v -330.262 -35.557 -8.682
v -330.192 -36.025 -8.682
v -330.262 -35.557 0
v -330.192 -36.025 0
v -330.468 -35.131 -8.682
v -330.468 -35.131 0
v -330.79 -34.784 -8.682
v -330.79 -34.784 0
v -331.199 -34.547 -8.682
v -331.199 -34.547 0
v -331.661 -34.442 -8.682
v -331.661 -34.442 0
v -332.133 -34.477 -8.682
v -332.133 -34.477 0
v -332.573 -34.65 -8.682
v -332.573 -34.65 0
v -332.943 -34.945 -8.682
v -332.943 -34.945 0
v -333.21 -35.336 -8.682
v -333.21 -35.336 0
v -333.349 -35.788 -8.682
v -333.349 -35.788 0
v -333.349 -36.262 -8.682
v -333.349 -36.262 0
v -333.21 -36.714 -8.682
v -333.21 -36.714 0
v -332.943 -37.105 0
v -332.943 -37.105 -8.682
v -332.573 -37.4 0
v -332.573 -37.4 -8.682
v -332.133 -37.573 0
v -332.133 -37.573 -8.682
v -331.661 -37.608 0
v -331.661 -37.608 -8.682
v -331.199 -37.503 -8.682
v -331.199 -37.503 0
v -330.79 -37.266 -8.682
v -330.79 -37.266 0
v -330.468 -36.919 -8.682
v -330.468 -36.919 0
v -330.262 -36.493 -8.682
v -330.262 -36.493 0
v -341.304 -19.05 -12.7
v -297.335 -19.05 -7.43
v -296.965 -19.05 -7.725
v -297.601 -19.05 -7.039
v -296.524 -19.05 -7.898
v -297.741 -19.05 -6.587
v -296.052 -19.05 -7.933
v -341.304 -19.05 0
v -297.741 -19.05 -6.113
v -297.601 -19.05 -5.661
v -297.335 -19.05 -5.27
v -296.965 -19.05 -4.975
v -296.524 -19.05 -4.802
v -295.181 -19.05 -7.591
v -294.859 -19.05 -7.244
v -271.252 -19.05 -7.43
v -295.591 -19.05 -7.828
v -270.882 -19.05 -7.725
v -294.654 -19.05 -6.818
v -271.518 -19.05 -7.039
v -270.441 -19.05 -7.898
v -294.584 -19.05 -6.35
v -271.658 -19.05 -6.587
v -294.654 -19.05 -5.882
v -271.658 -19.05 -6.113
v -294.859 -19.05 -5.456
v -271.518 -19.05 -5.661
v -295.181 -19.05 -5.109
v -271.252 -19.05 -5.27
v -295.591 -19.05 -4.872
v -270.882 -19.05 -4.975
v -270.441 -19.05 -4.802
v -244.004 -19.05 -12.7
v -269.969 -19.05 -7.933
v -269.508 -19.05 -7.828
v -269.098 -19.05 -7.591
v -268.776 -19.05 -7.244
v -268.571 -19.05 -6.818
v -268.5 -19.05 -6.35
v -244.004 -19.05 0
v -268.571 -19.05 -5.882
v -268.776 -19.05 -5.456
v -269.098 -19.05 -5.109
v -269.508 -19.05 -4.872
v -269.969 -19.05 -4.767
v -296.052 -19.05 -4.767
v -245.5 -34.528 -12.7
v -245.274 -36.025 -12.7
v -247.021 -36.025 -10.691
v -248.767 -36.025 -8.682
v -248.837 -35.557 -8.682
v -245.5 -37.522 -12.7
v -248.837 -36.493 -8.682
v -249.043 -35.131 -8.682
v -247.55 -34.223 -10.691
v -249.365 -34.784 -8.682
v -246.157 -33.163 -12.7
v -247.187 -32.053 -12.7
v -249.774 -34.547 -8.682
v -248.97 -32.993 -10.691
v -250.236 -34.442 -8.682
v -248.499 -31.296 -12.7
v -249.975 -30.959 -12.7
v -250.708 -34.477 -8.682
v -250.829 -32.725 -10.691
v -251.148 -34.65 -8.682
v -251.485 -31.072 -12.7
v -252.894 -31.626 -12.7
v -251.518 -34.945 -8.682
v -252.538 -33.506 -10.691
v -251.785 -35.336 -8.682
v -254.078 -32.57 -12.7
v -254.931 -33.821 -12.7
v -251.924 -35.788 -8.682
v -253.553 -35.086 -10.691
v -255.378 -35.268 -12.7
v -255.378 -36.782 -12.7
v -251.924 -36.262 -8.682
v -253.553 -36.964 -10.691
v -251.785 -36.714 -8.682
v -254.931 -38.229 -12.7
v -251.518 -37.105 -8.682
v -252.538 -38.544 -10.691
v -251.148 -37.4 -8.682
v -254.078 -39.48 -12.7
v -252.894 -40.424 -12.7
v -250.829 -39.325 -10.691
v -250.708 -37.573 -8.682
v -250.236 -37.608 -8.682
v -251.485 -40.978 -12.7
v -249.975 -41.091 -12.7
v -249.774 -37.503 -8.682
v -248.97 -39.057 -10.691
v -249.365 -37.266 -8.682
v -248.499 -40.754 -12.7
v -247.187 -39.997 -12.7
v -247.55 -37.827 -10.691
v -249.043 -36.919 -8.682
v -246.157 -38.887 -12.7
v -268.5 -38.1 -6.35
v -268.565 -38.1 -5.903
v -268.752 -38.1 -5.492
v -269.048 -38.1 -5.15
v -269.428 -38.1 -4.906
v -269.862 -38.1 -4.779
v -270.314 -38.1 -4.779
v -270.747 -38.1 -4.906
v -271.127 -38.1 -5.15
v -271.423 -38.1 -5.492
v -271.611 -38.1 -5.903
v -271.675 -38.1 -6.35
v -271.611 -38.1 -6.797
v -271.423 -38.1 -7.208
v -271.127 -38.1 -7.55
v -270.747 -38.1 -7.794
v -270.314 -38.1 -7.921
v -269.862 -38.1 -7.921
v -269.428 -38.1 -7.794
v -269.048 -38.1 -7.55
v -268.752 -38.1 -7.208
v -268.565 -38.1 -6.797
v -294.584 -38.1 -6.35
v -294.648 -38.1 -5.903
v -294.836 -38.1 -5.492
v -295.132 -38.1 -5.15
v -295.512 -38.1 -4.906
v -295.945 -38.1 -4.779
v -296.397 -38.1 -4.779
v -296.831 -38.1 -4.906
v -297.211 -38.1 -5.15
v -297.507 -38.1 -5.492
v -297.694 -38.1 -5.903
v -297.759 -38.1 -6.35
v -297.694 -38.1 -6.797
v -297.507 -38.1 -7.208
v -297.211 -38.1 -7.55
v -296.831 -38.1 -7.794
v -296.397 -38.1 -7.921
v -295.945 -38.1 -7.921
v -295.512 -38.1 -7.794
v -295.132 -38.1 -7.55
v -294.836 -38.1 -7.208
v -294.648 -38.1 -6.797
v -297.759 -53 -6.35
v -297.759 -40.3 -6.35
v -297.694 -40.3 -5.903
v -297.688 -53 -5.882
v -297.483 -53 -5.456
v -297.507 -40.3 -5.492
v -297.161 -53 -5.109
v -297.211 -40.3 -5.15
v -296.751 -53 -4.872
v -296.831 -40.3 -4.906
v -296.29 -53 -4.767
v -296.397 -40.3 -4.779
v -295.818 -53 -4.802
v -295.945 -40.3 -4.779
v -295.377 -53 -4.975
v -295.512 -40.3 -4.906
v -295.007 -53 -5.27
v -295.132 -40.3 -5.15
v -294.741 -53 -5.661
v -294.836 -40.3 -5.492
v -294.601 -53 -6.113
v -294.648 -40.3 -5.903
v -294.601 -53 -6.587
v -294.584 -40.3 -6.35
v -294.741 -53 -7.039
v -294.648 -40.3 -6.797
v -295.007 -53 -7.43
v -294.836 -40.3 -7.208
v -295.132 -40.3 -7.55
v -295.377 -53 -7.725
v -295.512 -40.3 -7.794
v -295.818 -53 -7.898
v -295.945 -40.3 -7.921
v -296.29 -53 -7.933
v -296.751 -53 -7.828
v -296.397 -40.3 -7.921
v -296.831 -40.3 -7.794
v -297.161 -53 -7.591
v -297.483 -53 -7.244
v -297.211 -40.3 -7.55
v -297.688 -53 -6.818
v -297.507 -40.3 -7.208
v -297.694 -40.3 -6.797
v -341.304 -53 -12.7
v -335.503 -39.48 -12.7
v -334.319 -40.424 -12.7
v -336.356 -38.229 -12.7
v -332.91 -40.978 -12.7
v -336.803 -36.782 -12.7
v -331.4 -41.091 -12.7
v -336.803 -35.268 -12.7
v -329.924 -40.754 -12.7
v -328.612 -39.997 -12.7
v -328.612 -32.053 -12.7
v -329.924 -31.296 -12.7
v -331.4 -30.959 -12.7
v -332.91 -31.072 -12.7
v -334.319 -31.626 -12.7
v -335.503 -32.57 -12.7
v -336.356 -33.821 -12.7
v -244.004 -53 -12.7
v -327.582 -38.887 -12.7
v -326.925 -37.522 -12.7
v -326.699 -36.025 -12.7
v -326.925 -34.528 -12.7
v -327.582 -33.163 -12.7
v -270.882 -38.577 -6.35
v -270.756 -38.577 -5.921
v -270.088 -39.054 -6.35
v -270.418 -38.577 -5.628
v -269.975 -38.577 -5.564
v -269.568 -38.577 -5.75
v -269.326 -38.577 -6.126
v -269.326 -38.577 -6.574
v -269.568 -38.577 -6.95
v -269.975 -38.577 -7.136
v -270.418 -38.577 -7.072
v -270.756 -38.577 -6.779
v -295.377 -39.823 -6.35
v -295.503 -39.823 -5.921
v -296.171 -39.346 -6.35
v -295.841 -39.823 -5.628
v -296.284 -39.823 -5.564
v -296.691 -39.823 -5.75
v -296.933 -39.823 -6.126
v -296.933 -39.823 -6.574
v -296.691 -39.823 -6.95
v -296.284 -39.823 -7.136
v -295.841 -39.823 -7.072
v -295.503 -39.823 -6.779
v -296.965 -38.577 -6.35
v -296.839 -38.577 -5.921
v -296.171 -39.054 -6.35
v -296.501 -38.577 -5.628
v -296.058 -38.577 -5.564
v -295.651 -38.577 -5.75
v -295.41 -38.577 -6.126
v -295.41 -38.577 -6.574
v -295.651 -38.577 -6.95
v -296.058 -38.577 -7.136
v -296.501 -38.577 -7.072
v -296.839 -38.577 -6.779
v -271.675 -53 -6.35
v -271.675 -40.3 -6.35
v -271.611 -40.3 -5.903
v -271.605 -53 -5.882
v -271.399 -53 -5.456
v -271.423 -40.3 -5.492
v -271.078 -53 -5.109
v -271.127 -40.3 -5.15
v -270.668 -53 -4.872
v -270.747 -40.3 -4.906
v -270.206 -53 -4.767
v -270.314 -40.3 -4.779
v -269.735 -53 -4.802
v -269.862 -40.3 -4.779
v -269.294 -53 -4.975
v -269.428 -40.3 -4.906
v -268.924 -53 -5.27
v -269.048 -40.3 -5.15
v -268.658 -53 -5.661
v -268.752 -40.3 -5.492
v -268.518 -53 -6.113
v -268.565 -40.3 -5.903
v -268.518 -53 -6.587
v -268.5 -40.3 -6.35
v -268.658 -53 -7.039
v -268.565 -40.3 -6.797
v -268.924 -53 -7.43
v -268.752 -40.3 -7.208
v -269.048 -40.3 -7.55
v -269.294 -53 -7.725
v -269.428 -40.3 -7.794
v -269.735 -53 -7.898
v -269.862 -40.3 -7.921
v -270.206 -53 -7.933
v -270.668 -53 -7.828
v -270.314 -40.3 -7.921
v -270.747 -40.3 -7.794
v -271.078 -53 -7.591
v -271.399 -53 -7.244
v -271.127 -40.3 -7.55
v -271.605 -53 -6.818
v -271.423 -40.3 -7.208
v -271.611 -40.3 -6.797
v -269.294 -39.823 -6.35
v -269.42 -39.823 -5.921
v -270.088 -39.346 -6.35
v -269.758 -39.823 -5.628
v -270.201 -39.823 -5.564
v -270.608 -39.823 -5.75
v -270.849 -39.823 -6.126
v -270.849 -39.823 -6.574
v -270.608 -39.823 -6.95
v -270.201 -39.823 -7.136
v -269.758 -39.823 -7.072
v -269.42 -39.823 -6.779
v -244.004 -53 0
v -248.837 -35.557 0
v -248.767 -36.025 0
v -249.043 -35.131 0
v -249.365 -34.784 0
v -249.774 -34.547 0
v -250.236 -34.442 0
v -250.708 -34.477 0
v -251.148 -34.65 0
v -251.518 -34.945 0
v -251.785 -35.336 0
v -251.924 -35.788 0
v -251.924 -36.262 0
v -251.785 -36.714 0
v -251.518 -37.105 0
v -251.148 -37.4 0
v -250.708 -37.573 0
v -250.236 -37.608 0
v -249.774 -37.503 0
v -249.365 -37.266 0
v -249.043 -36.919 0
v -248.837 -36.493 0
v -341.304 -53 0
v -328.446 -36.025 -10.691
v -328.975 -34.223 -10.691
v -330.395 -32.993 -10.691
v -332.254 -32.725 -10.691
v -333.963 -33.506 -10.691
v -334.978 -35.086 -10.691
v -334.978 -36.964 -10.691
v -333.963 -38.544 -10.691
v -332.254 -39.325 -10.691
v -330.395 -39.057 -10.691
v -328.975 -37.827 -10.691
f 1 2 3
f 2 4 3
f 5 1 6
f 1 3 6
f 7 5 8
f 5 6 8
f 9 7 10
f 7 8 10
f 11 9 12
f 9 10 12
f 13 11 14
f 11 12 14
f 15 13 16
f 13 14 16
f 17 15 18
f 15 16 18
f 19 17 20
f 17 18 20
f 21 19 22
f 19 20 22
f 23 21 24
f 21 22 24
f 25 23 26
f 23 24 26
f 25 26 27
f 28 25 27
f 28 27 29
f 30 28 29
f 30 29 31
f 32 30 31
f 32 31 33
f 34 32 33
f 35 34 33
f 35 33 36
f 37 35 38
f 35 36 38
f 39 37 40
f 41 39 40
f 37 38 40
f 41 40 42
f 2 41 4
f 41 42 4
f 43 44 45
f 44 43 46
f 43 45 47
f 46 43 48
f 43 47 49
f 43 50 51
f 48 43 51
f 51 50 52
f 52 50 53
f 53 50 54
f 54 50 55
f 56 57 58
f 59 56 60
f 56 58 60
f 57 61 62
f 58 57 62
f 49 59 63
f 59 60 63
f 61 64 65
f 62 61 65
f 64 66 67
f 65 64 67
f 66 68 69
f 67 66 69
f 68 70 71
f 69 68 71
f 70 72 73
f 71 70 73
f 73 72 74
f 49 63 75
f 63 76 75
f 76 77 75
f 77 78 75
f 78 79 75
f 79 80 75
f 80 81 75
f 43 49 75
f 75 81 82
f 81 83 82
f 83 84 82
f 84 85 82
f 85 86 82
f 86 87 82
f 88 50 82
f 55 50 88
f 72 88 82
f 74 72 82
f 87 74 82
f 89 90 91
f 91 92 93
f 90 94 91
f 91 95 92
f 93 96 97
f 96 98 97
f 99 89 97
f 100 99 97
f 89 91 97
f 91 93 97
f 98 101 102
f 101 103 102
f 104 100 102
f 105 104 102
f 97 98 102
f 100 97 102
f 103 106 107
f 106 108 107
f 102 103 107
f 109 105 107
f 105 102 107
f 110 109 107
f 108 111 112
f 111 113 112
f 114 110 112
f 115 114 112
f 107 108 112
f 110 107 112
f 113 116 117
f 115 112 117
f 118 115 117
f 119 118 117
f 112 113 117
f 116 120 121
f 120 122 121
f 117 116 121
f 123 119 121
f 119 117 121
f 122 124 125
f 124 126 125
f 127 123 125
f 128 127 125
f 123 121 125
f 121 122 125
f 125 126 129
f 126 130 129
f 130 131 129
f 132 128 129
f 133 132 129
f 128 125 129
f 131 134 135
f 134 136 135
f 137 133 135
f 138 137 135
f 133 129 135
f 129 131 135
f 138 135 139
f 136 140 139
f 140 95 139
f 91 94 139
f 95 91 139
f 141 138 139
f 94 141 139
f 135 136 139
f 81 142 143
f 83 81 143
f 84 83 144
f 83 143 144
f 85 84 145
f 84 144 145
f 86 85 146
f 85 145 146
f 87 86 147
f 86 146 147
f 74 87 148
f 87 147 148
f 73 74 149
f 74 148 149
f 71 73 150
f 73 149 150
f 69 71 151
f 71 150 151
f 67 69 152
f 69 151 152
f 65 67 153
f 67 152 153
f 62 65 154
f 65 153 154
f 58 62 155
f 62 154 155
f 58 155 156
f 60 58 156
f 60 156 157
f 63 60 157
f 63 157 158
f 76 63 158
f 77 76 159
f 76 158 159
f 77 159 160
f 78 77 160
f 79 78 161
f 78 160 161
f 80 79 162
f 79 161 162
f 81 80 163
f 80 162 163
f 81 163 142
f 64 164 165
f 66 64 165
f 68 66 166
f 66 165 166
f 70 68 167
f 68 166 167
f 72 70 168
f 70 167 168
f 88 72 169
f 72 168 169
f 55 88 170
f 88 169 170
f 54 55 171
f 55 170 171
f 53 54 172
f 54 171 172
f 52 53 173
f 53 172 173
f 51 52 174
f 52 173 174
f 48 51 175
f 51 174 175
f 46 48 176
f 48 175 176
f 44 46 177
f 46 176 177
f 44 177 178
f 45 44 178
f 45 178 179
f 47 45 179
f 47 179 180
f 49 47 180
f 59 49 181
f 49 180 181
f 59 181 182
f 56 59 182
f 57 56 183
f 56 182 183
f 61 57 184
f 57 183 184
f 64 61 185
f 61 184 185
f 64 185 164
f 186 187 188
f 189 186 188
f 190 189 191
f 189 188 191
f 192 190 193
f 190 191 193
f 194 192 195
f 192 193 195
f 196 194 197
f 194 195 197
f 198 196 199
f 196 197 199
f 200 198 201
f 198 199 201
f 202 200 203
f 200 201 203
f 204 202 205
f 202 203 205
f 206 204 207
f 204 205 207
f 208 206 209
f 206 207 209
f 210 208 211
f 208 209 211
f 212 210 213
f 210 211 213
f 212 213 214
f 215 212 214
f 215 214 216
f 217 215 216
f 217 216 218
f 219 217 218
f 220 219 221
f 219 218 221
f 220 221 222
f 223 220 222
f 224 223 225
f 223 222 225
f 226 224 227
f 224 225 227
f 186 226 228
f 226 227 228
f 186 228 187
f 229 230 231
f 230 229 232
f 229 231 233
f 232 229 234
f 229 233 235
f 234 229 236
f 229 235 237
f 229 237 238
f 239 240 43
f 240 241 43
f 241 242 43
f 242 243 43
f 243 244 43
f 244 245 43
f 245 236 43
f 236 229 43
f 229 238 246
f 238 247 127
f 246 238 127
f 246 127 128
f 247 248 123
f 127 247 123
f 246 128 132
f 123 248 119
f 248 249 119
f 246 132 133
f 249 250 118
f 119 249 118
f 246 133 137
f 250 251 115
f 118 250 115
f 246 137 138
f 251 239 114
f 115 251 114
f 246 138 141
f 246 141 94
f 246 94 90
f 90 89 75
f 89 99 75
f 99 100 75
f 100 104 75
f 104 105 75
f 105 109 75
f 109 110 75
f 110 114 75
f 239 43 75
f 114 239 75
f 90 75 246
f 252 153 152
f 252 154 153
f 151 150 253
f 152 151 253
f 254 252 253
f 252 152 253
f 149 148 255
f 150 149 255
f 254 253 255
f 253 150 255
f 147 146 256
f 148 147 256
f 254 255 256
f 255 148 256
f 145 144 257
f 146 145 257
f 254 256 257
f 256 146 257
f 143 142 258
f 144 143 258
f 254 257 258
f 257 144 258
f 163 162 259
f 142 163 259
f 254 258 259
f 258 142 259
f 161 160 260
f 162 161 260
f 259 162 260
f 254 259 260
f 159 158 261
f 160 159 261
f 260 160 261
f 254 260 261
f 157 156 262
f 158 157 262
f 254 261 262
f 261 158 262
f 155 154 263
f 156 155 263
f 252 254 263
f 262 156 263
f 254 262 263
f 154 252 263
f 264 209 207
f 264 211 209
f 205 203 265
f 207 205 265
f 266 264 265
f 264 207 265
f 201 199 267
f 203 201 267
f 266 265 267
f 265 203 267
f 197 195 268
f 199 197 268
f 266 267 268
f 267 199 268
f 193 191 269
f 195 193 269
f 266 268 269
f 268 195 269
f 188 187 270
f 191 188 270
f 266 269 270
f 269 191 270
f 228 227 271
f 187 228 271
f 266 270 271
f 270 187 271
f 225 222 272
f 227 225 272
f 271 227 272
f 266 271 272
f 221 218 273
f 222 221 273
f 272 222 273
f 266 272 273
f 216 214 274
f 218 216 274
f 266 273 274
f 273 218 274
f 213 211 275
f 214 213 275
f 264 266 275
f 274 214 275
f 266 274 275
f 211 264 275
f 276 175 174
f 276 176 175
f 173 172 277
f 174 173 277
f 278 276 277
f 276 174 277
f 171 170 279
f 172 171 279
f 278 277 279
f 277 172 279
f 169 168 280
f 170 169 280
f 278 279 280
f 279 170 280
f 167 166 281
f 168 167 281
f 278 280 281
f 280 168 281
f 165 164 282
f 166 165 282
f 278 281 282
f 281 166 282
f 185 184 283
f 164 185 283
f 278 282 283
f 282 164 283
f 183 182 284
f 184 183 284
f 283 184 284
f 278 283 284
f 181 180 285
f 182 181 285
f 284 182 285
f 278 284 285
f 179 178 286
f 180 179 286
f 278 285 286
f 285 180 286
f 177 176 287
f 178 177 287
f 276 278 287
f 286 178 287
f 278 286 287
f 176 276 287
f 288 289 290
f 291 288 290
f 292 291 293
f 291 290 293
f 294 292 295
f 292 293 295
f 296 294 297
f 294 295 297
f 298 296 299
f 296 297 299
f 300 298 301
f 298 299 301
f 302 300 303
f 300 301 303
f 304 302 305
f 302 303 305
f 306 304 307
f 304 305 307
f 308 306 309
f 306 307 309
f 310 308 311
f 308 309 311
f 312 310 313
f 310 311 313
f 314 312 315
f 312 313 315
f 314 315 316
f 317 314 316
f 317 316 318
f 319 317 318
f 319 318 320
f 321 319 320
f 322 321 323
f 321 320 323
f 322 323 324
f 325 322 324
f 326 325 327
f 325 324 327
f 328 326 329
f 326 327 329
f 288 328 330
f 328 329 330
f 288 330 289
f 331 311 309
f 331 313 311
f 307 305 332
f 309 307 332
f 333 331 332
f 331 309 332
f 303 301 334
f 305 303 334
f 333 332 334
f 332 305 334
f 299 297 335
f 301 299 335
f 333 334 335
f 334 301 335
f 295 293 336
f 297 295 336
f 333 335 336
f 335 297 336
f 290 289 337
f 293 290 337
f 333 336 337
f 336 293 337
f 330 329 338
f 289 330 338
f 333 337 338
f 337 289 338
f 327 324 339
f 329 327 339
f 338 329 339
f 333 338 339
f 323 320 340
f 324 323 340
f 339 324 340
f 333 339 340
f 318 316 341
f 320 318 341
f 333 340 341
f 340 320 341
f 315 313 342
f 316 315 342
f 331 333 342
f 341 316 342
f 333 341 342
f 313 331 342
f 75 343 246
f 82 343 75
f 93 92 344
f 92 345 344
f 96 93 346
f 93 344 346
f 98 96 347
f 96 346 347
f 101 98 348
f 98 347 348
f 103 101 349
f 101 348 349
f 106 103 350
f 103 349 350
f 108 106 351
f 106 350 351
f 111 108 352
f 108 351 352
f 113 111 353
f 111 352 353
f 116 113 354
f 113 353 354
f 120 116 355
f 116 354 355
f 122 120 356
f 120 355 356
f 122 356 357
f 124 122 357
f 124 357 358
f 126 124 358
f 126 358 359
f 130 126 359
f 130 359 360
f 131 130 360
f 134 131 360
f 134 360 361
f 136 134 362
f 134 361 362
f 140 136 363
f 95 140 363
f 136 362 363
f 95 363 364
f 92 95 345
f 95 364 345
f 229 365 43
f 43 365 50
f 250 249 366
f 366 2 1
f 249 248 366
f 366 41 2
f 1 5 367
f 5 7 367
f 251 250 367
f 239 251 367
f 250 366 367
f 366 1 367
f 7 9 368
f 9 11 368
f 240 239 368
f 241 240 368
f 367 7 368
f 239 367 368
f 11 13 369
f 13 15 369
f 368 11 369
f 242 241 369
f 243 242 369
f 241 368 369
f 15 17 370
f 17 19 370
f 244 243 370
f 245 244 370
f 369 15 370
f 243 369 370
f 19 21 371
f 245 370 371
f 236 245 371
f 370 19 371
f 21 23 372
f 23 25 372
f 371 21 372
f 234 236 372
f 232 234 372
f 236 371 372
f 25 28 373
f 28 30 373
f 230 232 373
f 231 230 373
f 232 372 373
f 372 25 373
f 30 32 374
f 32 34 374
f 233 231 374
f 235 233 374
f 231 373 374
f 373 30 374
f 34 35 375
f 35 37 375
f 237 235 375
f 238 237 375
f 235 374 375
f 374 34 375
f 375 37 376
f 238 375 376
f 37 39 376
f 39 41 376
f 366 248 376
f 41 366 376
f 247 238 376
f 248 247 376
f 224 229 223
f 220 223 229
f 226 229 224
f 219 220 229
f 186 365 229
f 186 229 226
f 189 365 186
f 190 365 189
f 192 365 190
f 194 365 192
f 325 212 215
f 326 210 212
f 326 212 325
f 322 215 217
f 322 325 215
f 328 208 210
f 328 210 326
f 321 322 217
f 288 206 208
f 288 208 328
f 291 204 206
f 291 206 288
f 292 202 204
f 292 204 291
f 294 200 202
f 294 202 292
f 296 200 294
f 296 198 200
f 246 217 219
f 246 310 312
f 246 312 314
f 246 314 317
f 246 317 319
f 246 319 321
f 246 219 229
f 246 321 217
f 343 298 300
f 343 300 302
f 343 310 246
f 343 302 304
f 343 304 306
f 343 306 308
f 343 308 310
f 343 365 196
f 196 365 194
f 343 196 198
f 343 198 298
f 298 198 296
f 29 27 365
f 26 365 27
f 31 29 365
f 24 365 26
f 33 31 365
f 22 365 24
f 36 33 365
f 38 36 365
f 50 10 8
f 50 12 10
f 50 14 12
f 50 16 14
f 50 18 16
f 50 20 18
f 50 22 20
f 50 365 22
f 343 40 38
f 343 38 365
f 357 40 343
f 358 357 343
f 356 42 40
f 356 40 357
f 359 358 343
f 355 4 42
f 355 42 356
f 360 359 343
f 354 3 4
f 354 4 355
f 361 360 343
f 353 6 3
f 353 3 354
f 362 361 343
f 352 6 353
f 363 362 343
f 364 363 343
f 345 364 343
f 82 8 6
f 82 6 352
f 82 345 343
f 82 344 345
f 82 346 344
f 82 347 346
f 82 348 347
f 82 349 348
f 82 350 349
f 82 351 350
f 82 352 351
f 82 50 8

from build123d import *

# Parameters (mm, degrees)
SKETCH1_W           = 97.3
SKETCH1_H           = 33.95
BOSS_EXTRUDE1_DEPTH = 12.7
HOLE1_D             = 3.175
HOLE1_DEPTH         = 31.75
HOLE1_CSINK_D       = 10.16
HOLE1_CSINK_ANGLE   = 82
HOLE1_TIP           = 0.953866233
HOLE2_D             = 3.175
HOLE2_DEPTH         = 31.75
HOLE2_CSINK_D       = 10.16
HOLE2_CSINK_ANGLE   = 82
HOLE2_TIP           = 0.953866233
HOLE5_D             = 3.175
HOLE5_DEPTH         = 31.75
HOLE5_CSINK_D       = 10.16
HOLE5_CSINK_ANGLE   = 82
HOLE5_TIP           = 0.953866233
HOLE6_D             = 3.175
HOLE6_DEPTH         = 31.75
HOLE6_CSINK_D       = 10.16
HOLE6_CSINK_ANGLE   = 82
HOLE6_TIP           = 0.953866233


with BuildPart() as part:
    # Sketch1 → Boss-Extrude1 (new body)
    with BuildSketch(Plane.XY):
        with Locations((-292.654465963, -36.025)):
            Rectangle(SKETCH1_W, SKETCH1_H)
    extrude(amount=-BOSS_EXTRUDE1_DEPTH)

    # Hole1
    with Locations(Plane(origin=(-124.004465969, 0, -10.424290059), x_dir=(-1, 0, 0), z_dir=(0, 1, 0))):
        with Locations((126.349999994, 161.374290059), (146.083333327, 4.074290059), (172.166666661, 4.074290059), (126.349999994, 34.524290059), (126.349999994, 130.924290059), (-172.166666661, 4.074290059), (-146.083333327, 4.074290059), (-126.349999994, 34.524290059), (-126.349999994, 130.924290059), (-126.349999994, 161.374290059)):
            CounterSinkHole(HOLE1_D / 2, HOLE1_CSINK_D / 2, depth=HOLE1_DEPTH, counter_sink_angle=HOLE1_CSINK_ANGLE)
            with Locations((0, 0, -(HOLE1_DEPTH + HOLE1_TIP / 2))):  # 118° drill point
                Cone(0, HOLE1_D / 2, HOLE1_TIP, mode=Mode.SUBTRACT)

    # Hole2
    with Locations(Plane(origin=(-124.004465969, -72.05, -10.424290059), x_dir=(1, 0, 0), z_dir=(0, -1, 0))):
        with Locations((126.349999994, 161.374290059), (146.083333327, 4.074290059), (172.166666661, 4.074290059), (126.349999994, 34.524290059), (126.349999994, 130.924290059), (-172.166666661, 4.074290059), (-146.083333327, 4.074290059), (-126.349999994, 34.524290059), (-126.349999994, 130.924290059), (-126.349999994, 161.374290059)):
            CounterSinkHole(HOLE2_D / 2, HOLE2_CSINK_D / 2, depth=HOLE2_DEPTH, counter_sink_angle=HOLE2_CSINK_ANGLE)
            with Locations((0, 0, -(HOLE2_DEPTH + HOLE2_TIP / 2))):  # 118° drill point
                Cone(0, HOLE2_D / 2, HOLE2_TIP, mode=Mode.SUBTRACT)

    # Hole5
    with Locations(Plane(origin=(-124.004465969, -208.286738577, -12.7), x_dir=(-1, 0, 0), z_dir=(0, 0, -1))):
        with Locations((207.774999994, 172.261738577), (126.349999994, 172.261738577)):
            CounterSinkHole(HOLE5_D / 2, HOLE5_CSINK_D / 2, depth=HOLE5_DEPTH, counter_sink_angle=HOLE5_CSINK_ANGLE)
            with Locations((0, 0, -(HOLE5_DEPTH + HOLE5_TIP / 2))):  # 118° drill point
                Cone(0, HOLE5_D / 2, HOLE5_TIP, mode=Mode.SUBTRACT)

    # Hole6
    with Locations(Plane(origin=(-124.004465969, -6.35, -10.424290059), x_dir=(-1, 0, 0), z_dir=(0, 1, 0))):
        with Locations((-207.774999994, 333.02141023), (-207.774999994, 225.48903684), (-207.774999994, 137.424290059), (-172.166666661, 4.074290059), (-146.083333327, 4.074290059), (-94.599999994, 161.374290059), (94.599999994, 161.374290059), (146.083333327, 4.074290059), (172.166666661, 4.074290059), (207.774999994, 137.424290059), (207.774999994, 225.48903684), (207.774999994, 333.02141023), (166.795833328, 301.970350905), (40.979166666, 301.970350905), (-40.979166666, 301.970350905), (-166.795833328, 301.970350905), (0, 193.124290059), (0, 301.970350905), (0, 412.366411751), (-126.349999994, 106.824290059), (-126.349999994, 58.624290059), (126.349999994, 58.624290059), (126.349999994, 106.824290059)):
            CounterSinkHole(HOLE6_D / 2, HOLE6_CSINK_D / 2, depth=HOLE6_DEPTH, counter_sink_angle=HOLE6_CSINK_ANGLE)
            with Locations((0, 0, -(HOLE6_DEPTH + HOLE6_TIP / 2))):  # 118° drill point
                Cone(0, HOLE6_D / 2, HOLE6_TIP, mode=Mode.SUBTRACT)


solid = part.part
